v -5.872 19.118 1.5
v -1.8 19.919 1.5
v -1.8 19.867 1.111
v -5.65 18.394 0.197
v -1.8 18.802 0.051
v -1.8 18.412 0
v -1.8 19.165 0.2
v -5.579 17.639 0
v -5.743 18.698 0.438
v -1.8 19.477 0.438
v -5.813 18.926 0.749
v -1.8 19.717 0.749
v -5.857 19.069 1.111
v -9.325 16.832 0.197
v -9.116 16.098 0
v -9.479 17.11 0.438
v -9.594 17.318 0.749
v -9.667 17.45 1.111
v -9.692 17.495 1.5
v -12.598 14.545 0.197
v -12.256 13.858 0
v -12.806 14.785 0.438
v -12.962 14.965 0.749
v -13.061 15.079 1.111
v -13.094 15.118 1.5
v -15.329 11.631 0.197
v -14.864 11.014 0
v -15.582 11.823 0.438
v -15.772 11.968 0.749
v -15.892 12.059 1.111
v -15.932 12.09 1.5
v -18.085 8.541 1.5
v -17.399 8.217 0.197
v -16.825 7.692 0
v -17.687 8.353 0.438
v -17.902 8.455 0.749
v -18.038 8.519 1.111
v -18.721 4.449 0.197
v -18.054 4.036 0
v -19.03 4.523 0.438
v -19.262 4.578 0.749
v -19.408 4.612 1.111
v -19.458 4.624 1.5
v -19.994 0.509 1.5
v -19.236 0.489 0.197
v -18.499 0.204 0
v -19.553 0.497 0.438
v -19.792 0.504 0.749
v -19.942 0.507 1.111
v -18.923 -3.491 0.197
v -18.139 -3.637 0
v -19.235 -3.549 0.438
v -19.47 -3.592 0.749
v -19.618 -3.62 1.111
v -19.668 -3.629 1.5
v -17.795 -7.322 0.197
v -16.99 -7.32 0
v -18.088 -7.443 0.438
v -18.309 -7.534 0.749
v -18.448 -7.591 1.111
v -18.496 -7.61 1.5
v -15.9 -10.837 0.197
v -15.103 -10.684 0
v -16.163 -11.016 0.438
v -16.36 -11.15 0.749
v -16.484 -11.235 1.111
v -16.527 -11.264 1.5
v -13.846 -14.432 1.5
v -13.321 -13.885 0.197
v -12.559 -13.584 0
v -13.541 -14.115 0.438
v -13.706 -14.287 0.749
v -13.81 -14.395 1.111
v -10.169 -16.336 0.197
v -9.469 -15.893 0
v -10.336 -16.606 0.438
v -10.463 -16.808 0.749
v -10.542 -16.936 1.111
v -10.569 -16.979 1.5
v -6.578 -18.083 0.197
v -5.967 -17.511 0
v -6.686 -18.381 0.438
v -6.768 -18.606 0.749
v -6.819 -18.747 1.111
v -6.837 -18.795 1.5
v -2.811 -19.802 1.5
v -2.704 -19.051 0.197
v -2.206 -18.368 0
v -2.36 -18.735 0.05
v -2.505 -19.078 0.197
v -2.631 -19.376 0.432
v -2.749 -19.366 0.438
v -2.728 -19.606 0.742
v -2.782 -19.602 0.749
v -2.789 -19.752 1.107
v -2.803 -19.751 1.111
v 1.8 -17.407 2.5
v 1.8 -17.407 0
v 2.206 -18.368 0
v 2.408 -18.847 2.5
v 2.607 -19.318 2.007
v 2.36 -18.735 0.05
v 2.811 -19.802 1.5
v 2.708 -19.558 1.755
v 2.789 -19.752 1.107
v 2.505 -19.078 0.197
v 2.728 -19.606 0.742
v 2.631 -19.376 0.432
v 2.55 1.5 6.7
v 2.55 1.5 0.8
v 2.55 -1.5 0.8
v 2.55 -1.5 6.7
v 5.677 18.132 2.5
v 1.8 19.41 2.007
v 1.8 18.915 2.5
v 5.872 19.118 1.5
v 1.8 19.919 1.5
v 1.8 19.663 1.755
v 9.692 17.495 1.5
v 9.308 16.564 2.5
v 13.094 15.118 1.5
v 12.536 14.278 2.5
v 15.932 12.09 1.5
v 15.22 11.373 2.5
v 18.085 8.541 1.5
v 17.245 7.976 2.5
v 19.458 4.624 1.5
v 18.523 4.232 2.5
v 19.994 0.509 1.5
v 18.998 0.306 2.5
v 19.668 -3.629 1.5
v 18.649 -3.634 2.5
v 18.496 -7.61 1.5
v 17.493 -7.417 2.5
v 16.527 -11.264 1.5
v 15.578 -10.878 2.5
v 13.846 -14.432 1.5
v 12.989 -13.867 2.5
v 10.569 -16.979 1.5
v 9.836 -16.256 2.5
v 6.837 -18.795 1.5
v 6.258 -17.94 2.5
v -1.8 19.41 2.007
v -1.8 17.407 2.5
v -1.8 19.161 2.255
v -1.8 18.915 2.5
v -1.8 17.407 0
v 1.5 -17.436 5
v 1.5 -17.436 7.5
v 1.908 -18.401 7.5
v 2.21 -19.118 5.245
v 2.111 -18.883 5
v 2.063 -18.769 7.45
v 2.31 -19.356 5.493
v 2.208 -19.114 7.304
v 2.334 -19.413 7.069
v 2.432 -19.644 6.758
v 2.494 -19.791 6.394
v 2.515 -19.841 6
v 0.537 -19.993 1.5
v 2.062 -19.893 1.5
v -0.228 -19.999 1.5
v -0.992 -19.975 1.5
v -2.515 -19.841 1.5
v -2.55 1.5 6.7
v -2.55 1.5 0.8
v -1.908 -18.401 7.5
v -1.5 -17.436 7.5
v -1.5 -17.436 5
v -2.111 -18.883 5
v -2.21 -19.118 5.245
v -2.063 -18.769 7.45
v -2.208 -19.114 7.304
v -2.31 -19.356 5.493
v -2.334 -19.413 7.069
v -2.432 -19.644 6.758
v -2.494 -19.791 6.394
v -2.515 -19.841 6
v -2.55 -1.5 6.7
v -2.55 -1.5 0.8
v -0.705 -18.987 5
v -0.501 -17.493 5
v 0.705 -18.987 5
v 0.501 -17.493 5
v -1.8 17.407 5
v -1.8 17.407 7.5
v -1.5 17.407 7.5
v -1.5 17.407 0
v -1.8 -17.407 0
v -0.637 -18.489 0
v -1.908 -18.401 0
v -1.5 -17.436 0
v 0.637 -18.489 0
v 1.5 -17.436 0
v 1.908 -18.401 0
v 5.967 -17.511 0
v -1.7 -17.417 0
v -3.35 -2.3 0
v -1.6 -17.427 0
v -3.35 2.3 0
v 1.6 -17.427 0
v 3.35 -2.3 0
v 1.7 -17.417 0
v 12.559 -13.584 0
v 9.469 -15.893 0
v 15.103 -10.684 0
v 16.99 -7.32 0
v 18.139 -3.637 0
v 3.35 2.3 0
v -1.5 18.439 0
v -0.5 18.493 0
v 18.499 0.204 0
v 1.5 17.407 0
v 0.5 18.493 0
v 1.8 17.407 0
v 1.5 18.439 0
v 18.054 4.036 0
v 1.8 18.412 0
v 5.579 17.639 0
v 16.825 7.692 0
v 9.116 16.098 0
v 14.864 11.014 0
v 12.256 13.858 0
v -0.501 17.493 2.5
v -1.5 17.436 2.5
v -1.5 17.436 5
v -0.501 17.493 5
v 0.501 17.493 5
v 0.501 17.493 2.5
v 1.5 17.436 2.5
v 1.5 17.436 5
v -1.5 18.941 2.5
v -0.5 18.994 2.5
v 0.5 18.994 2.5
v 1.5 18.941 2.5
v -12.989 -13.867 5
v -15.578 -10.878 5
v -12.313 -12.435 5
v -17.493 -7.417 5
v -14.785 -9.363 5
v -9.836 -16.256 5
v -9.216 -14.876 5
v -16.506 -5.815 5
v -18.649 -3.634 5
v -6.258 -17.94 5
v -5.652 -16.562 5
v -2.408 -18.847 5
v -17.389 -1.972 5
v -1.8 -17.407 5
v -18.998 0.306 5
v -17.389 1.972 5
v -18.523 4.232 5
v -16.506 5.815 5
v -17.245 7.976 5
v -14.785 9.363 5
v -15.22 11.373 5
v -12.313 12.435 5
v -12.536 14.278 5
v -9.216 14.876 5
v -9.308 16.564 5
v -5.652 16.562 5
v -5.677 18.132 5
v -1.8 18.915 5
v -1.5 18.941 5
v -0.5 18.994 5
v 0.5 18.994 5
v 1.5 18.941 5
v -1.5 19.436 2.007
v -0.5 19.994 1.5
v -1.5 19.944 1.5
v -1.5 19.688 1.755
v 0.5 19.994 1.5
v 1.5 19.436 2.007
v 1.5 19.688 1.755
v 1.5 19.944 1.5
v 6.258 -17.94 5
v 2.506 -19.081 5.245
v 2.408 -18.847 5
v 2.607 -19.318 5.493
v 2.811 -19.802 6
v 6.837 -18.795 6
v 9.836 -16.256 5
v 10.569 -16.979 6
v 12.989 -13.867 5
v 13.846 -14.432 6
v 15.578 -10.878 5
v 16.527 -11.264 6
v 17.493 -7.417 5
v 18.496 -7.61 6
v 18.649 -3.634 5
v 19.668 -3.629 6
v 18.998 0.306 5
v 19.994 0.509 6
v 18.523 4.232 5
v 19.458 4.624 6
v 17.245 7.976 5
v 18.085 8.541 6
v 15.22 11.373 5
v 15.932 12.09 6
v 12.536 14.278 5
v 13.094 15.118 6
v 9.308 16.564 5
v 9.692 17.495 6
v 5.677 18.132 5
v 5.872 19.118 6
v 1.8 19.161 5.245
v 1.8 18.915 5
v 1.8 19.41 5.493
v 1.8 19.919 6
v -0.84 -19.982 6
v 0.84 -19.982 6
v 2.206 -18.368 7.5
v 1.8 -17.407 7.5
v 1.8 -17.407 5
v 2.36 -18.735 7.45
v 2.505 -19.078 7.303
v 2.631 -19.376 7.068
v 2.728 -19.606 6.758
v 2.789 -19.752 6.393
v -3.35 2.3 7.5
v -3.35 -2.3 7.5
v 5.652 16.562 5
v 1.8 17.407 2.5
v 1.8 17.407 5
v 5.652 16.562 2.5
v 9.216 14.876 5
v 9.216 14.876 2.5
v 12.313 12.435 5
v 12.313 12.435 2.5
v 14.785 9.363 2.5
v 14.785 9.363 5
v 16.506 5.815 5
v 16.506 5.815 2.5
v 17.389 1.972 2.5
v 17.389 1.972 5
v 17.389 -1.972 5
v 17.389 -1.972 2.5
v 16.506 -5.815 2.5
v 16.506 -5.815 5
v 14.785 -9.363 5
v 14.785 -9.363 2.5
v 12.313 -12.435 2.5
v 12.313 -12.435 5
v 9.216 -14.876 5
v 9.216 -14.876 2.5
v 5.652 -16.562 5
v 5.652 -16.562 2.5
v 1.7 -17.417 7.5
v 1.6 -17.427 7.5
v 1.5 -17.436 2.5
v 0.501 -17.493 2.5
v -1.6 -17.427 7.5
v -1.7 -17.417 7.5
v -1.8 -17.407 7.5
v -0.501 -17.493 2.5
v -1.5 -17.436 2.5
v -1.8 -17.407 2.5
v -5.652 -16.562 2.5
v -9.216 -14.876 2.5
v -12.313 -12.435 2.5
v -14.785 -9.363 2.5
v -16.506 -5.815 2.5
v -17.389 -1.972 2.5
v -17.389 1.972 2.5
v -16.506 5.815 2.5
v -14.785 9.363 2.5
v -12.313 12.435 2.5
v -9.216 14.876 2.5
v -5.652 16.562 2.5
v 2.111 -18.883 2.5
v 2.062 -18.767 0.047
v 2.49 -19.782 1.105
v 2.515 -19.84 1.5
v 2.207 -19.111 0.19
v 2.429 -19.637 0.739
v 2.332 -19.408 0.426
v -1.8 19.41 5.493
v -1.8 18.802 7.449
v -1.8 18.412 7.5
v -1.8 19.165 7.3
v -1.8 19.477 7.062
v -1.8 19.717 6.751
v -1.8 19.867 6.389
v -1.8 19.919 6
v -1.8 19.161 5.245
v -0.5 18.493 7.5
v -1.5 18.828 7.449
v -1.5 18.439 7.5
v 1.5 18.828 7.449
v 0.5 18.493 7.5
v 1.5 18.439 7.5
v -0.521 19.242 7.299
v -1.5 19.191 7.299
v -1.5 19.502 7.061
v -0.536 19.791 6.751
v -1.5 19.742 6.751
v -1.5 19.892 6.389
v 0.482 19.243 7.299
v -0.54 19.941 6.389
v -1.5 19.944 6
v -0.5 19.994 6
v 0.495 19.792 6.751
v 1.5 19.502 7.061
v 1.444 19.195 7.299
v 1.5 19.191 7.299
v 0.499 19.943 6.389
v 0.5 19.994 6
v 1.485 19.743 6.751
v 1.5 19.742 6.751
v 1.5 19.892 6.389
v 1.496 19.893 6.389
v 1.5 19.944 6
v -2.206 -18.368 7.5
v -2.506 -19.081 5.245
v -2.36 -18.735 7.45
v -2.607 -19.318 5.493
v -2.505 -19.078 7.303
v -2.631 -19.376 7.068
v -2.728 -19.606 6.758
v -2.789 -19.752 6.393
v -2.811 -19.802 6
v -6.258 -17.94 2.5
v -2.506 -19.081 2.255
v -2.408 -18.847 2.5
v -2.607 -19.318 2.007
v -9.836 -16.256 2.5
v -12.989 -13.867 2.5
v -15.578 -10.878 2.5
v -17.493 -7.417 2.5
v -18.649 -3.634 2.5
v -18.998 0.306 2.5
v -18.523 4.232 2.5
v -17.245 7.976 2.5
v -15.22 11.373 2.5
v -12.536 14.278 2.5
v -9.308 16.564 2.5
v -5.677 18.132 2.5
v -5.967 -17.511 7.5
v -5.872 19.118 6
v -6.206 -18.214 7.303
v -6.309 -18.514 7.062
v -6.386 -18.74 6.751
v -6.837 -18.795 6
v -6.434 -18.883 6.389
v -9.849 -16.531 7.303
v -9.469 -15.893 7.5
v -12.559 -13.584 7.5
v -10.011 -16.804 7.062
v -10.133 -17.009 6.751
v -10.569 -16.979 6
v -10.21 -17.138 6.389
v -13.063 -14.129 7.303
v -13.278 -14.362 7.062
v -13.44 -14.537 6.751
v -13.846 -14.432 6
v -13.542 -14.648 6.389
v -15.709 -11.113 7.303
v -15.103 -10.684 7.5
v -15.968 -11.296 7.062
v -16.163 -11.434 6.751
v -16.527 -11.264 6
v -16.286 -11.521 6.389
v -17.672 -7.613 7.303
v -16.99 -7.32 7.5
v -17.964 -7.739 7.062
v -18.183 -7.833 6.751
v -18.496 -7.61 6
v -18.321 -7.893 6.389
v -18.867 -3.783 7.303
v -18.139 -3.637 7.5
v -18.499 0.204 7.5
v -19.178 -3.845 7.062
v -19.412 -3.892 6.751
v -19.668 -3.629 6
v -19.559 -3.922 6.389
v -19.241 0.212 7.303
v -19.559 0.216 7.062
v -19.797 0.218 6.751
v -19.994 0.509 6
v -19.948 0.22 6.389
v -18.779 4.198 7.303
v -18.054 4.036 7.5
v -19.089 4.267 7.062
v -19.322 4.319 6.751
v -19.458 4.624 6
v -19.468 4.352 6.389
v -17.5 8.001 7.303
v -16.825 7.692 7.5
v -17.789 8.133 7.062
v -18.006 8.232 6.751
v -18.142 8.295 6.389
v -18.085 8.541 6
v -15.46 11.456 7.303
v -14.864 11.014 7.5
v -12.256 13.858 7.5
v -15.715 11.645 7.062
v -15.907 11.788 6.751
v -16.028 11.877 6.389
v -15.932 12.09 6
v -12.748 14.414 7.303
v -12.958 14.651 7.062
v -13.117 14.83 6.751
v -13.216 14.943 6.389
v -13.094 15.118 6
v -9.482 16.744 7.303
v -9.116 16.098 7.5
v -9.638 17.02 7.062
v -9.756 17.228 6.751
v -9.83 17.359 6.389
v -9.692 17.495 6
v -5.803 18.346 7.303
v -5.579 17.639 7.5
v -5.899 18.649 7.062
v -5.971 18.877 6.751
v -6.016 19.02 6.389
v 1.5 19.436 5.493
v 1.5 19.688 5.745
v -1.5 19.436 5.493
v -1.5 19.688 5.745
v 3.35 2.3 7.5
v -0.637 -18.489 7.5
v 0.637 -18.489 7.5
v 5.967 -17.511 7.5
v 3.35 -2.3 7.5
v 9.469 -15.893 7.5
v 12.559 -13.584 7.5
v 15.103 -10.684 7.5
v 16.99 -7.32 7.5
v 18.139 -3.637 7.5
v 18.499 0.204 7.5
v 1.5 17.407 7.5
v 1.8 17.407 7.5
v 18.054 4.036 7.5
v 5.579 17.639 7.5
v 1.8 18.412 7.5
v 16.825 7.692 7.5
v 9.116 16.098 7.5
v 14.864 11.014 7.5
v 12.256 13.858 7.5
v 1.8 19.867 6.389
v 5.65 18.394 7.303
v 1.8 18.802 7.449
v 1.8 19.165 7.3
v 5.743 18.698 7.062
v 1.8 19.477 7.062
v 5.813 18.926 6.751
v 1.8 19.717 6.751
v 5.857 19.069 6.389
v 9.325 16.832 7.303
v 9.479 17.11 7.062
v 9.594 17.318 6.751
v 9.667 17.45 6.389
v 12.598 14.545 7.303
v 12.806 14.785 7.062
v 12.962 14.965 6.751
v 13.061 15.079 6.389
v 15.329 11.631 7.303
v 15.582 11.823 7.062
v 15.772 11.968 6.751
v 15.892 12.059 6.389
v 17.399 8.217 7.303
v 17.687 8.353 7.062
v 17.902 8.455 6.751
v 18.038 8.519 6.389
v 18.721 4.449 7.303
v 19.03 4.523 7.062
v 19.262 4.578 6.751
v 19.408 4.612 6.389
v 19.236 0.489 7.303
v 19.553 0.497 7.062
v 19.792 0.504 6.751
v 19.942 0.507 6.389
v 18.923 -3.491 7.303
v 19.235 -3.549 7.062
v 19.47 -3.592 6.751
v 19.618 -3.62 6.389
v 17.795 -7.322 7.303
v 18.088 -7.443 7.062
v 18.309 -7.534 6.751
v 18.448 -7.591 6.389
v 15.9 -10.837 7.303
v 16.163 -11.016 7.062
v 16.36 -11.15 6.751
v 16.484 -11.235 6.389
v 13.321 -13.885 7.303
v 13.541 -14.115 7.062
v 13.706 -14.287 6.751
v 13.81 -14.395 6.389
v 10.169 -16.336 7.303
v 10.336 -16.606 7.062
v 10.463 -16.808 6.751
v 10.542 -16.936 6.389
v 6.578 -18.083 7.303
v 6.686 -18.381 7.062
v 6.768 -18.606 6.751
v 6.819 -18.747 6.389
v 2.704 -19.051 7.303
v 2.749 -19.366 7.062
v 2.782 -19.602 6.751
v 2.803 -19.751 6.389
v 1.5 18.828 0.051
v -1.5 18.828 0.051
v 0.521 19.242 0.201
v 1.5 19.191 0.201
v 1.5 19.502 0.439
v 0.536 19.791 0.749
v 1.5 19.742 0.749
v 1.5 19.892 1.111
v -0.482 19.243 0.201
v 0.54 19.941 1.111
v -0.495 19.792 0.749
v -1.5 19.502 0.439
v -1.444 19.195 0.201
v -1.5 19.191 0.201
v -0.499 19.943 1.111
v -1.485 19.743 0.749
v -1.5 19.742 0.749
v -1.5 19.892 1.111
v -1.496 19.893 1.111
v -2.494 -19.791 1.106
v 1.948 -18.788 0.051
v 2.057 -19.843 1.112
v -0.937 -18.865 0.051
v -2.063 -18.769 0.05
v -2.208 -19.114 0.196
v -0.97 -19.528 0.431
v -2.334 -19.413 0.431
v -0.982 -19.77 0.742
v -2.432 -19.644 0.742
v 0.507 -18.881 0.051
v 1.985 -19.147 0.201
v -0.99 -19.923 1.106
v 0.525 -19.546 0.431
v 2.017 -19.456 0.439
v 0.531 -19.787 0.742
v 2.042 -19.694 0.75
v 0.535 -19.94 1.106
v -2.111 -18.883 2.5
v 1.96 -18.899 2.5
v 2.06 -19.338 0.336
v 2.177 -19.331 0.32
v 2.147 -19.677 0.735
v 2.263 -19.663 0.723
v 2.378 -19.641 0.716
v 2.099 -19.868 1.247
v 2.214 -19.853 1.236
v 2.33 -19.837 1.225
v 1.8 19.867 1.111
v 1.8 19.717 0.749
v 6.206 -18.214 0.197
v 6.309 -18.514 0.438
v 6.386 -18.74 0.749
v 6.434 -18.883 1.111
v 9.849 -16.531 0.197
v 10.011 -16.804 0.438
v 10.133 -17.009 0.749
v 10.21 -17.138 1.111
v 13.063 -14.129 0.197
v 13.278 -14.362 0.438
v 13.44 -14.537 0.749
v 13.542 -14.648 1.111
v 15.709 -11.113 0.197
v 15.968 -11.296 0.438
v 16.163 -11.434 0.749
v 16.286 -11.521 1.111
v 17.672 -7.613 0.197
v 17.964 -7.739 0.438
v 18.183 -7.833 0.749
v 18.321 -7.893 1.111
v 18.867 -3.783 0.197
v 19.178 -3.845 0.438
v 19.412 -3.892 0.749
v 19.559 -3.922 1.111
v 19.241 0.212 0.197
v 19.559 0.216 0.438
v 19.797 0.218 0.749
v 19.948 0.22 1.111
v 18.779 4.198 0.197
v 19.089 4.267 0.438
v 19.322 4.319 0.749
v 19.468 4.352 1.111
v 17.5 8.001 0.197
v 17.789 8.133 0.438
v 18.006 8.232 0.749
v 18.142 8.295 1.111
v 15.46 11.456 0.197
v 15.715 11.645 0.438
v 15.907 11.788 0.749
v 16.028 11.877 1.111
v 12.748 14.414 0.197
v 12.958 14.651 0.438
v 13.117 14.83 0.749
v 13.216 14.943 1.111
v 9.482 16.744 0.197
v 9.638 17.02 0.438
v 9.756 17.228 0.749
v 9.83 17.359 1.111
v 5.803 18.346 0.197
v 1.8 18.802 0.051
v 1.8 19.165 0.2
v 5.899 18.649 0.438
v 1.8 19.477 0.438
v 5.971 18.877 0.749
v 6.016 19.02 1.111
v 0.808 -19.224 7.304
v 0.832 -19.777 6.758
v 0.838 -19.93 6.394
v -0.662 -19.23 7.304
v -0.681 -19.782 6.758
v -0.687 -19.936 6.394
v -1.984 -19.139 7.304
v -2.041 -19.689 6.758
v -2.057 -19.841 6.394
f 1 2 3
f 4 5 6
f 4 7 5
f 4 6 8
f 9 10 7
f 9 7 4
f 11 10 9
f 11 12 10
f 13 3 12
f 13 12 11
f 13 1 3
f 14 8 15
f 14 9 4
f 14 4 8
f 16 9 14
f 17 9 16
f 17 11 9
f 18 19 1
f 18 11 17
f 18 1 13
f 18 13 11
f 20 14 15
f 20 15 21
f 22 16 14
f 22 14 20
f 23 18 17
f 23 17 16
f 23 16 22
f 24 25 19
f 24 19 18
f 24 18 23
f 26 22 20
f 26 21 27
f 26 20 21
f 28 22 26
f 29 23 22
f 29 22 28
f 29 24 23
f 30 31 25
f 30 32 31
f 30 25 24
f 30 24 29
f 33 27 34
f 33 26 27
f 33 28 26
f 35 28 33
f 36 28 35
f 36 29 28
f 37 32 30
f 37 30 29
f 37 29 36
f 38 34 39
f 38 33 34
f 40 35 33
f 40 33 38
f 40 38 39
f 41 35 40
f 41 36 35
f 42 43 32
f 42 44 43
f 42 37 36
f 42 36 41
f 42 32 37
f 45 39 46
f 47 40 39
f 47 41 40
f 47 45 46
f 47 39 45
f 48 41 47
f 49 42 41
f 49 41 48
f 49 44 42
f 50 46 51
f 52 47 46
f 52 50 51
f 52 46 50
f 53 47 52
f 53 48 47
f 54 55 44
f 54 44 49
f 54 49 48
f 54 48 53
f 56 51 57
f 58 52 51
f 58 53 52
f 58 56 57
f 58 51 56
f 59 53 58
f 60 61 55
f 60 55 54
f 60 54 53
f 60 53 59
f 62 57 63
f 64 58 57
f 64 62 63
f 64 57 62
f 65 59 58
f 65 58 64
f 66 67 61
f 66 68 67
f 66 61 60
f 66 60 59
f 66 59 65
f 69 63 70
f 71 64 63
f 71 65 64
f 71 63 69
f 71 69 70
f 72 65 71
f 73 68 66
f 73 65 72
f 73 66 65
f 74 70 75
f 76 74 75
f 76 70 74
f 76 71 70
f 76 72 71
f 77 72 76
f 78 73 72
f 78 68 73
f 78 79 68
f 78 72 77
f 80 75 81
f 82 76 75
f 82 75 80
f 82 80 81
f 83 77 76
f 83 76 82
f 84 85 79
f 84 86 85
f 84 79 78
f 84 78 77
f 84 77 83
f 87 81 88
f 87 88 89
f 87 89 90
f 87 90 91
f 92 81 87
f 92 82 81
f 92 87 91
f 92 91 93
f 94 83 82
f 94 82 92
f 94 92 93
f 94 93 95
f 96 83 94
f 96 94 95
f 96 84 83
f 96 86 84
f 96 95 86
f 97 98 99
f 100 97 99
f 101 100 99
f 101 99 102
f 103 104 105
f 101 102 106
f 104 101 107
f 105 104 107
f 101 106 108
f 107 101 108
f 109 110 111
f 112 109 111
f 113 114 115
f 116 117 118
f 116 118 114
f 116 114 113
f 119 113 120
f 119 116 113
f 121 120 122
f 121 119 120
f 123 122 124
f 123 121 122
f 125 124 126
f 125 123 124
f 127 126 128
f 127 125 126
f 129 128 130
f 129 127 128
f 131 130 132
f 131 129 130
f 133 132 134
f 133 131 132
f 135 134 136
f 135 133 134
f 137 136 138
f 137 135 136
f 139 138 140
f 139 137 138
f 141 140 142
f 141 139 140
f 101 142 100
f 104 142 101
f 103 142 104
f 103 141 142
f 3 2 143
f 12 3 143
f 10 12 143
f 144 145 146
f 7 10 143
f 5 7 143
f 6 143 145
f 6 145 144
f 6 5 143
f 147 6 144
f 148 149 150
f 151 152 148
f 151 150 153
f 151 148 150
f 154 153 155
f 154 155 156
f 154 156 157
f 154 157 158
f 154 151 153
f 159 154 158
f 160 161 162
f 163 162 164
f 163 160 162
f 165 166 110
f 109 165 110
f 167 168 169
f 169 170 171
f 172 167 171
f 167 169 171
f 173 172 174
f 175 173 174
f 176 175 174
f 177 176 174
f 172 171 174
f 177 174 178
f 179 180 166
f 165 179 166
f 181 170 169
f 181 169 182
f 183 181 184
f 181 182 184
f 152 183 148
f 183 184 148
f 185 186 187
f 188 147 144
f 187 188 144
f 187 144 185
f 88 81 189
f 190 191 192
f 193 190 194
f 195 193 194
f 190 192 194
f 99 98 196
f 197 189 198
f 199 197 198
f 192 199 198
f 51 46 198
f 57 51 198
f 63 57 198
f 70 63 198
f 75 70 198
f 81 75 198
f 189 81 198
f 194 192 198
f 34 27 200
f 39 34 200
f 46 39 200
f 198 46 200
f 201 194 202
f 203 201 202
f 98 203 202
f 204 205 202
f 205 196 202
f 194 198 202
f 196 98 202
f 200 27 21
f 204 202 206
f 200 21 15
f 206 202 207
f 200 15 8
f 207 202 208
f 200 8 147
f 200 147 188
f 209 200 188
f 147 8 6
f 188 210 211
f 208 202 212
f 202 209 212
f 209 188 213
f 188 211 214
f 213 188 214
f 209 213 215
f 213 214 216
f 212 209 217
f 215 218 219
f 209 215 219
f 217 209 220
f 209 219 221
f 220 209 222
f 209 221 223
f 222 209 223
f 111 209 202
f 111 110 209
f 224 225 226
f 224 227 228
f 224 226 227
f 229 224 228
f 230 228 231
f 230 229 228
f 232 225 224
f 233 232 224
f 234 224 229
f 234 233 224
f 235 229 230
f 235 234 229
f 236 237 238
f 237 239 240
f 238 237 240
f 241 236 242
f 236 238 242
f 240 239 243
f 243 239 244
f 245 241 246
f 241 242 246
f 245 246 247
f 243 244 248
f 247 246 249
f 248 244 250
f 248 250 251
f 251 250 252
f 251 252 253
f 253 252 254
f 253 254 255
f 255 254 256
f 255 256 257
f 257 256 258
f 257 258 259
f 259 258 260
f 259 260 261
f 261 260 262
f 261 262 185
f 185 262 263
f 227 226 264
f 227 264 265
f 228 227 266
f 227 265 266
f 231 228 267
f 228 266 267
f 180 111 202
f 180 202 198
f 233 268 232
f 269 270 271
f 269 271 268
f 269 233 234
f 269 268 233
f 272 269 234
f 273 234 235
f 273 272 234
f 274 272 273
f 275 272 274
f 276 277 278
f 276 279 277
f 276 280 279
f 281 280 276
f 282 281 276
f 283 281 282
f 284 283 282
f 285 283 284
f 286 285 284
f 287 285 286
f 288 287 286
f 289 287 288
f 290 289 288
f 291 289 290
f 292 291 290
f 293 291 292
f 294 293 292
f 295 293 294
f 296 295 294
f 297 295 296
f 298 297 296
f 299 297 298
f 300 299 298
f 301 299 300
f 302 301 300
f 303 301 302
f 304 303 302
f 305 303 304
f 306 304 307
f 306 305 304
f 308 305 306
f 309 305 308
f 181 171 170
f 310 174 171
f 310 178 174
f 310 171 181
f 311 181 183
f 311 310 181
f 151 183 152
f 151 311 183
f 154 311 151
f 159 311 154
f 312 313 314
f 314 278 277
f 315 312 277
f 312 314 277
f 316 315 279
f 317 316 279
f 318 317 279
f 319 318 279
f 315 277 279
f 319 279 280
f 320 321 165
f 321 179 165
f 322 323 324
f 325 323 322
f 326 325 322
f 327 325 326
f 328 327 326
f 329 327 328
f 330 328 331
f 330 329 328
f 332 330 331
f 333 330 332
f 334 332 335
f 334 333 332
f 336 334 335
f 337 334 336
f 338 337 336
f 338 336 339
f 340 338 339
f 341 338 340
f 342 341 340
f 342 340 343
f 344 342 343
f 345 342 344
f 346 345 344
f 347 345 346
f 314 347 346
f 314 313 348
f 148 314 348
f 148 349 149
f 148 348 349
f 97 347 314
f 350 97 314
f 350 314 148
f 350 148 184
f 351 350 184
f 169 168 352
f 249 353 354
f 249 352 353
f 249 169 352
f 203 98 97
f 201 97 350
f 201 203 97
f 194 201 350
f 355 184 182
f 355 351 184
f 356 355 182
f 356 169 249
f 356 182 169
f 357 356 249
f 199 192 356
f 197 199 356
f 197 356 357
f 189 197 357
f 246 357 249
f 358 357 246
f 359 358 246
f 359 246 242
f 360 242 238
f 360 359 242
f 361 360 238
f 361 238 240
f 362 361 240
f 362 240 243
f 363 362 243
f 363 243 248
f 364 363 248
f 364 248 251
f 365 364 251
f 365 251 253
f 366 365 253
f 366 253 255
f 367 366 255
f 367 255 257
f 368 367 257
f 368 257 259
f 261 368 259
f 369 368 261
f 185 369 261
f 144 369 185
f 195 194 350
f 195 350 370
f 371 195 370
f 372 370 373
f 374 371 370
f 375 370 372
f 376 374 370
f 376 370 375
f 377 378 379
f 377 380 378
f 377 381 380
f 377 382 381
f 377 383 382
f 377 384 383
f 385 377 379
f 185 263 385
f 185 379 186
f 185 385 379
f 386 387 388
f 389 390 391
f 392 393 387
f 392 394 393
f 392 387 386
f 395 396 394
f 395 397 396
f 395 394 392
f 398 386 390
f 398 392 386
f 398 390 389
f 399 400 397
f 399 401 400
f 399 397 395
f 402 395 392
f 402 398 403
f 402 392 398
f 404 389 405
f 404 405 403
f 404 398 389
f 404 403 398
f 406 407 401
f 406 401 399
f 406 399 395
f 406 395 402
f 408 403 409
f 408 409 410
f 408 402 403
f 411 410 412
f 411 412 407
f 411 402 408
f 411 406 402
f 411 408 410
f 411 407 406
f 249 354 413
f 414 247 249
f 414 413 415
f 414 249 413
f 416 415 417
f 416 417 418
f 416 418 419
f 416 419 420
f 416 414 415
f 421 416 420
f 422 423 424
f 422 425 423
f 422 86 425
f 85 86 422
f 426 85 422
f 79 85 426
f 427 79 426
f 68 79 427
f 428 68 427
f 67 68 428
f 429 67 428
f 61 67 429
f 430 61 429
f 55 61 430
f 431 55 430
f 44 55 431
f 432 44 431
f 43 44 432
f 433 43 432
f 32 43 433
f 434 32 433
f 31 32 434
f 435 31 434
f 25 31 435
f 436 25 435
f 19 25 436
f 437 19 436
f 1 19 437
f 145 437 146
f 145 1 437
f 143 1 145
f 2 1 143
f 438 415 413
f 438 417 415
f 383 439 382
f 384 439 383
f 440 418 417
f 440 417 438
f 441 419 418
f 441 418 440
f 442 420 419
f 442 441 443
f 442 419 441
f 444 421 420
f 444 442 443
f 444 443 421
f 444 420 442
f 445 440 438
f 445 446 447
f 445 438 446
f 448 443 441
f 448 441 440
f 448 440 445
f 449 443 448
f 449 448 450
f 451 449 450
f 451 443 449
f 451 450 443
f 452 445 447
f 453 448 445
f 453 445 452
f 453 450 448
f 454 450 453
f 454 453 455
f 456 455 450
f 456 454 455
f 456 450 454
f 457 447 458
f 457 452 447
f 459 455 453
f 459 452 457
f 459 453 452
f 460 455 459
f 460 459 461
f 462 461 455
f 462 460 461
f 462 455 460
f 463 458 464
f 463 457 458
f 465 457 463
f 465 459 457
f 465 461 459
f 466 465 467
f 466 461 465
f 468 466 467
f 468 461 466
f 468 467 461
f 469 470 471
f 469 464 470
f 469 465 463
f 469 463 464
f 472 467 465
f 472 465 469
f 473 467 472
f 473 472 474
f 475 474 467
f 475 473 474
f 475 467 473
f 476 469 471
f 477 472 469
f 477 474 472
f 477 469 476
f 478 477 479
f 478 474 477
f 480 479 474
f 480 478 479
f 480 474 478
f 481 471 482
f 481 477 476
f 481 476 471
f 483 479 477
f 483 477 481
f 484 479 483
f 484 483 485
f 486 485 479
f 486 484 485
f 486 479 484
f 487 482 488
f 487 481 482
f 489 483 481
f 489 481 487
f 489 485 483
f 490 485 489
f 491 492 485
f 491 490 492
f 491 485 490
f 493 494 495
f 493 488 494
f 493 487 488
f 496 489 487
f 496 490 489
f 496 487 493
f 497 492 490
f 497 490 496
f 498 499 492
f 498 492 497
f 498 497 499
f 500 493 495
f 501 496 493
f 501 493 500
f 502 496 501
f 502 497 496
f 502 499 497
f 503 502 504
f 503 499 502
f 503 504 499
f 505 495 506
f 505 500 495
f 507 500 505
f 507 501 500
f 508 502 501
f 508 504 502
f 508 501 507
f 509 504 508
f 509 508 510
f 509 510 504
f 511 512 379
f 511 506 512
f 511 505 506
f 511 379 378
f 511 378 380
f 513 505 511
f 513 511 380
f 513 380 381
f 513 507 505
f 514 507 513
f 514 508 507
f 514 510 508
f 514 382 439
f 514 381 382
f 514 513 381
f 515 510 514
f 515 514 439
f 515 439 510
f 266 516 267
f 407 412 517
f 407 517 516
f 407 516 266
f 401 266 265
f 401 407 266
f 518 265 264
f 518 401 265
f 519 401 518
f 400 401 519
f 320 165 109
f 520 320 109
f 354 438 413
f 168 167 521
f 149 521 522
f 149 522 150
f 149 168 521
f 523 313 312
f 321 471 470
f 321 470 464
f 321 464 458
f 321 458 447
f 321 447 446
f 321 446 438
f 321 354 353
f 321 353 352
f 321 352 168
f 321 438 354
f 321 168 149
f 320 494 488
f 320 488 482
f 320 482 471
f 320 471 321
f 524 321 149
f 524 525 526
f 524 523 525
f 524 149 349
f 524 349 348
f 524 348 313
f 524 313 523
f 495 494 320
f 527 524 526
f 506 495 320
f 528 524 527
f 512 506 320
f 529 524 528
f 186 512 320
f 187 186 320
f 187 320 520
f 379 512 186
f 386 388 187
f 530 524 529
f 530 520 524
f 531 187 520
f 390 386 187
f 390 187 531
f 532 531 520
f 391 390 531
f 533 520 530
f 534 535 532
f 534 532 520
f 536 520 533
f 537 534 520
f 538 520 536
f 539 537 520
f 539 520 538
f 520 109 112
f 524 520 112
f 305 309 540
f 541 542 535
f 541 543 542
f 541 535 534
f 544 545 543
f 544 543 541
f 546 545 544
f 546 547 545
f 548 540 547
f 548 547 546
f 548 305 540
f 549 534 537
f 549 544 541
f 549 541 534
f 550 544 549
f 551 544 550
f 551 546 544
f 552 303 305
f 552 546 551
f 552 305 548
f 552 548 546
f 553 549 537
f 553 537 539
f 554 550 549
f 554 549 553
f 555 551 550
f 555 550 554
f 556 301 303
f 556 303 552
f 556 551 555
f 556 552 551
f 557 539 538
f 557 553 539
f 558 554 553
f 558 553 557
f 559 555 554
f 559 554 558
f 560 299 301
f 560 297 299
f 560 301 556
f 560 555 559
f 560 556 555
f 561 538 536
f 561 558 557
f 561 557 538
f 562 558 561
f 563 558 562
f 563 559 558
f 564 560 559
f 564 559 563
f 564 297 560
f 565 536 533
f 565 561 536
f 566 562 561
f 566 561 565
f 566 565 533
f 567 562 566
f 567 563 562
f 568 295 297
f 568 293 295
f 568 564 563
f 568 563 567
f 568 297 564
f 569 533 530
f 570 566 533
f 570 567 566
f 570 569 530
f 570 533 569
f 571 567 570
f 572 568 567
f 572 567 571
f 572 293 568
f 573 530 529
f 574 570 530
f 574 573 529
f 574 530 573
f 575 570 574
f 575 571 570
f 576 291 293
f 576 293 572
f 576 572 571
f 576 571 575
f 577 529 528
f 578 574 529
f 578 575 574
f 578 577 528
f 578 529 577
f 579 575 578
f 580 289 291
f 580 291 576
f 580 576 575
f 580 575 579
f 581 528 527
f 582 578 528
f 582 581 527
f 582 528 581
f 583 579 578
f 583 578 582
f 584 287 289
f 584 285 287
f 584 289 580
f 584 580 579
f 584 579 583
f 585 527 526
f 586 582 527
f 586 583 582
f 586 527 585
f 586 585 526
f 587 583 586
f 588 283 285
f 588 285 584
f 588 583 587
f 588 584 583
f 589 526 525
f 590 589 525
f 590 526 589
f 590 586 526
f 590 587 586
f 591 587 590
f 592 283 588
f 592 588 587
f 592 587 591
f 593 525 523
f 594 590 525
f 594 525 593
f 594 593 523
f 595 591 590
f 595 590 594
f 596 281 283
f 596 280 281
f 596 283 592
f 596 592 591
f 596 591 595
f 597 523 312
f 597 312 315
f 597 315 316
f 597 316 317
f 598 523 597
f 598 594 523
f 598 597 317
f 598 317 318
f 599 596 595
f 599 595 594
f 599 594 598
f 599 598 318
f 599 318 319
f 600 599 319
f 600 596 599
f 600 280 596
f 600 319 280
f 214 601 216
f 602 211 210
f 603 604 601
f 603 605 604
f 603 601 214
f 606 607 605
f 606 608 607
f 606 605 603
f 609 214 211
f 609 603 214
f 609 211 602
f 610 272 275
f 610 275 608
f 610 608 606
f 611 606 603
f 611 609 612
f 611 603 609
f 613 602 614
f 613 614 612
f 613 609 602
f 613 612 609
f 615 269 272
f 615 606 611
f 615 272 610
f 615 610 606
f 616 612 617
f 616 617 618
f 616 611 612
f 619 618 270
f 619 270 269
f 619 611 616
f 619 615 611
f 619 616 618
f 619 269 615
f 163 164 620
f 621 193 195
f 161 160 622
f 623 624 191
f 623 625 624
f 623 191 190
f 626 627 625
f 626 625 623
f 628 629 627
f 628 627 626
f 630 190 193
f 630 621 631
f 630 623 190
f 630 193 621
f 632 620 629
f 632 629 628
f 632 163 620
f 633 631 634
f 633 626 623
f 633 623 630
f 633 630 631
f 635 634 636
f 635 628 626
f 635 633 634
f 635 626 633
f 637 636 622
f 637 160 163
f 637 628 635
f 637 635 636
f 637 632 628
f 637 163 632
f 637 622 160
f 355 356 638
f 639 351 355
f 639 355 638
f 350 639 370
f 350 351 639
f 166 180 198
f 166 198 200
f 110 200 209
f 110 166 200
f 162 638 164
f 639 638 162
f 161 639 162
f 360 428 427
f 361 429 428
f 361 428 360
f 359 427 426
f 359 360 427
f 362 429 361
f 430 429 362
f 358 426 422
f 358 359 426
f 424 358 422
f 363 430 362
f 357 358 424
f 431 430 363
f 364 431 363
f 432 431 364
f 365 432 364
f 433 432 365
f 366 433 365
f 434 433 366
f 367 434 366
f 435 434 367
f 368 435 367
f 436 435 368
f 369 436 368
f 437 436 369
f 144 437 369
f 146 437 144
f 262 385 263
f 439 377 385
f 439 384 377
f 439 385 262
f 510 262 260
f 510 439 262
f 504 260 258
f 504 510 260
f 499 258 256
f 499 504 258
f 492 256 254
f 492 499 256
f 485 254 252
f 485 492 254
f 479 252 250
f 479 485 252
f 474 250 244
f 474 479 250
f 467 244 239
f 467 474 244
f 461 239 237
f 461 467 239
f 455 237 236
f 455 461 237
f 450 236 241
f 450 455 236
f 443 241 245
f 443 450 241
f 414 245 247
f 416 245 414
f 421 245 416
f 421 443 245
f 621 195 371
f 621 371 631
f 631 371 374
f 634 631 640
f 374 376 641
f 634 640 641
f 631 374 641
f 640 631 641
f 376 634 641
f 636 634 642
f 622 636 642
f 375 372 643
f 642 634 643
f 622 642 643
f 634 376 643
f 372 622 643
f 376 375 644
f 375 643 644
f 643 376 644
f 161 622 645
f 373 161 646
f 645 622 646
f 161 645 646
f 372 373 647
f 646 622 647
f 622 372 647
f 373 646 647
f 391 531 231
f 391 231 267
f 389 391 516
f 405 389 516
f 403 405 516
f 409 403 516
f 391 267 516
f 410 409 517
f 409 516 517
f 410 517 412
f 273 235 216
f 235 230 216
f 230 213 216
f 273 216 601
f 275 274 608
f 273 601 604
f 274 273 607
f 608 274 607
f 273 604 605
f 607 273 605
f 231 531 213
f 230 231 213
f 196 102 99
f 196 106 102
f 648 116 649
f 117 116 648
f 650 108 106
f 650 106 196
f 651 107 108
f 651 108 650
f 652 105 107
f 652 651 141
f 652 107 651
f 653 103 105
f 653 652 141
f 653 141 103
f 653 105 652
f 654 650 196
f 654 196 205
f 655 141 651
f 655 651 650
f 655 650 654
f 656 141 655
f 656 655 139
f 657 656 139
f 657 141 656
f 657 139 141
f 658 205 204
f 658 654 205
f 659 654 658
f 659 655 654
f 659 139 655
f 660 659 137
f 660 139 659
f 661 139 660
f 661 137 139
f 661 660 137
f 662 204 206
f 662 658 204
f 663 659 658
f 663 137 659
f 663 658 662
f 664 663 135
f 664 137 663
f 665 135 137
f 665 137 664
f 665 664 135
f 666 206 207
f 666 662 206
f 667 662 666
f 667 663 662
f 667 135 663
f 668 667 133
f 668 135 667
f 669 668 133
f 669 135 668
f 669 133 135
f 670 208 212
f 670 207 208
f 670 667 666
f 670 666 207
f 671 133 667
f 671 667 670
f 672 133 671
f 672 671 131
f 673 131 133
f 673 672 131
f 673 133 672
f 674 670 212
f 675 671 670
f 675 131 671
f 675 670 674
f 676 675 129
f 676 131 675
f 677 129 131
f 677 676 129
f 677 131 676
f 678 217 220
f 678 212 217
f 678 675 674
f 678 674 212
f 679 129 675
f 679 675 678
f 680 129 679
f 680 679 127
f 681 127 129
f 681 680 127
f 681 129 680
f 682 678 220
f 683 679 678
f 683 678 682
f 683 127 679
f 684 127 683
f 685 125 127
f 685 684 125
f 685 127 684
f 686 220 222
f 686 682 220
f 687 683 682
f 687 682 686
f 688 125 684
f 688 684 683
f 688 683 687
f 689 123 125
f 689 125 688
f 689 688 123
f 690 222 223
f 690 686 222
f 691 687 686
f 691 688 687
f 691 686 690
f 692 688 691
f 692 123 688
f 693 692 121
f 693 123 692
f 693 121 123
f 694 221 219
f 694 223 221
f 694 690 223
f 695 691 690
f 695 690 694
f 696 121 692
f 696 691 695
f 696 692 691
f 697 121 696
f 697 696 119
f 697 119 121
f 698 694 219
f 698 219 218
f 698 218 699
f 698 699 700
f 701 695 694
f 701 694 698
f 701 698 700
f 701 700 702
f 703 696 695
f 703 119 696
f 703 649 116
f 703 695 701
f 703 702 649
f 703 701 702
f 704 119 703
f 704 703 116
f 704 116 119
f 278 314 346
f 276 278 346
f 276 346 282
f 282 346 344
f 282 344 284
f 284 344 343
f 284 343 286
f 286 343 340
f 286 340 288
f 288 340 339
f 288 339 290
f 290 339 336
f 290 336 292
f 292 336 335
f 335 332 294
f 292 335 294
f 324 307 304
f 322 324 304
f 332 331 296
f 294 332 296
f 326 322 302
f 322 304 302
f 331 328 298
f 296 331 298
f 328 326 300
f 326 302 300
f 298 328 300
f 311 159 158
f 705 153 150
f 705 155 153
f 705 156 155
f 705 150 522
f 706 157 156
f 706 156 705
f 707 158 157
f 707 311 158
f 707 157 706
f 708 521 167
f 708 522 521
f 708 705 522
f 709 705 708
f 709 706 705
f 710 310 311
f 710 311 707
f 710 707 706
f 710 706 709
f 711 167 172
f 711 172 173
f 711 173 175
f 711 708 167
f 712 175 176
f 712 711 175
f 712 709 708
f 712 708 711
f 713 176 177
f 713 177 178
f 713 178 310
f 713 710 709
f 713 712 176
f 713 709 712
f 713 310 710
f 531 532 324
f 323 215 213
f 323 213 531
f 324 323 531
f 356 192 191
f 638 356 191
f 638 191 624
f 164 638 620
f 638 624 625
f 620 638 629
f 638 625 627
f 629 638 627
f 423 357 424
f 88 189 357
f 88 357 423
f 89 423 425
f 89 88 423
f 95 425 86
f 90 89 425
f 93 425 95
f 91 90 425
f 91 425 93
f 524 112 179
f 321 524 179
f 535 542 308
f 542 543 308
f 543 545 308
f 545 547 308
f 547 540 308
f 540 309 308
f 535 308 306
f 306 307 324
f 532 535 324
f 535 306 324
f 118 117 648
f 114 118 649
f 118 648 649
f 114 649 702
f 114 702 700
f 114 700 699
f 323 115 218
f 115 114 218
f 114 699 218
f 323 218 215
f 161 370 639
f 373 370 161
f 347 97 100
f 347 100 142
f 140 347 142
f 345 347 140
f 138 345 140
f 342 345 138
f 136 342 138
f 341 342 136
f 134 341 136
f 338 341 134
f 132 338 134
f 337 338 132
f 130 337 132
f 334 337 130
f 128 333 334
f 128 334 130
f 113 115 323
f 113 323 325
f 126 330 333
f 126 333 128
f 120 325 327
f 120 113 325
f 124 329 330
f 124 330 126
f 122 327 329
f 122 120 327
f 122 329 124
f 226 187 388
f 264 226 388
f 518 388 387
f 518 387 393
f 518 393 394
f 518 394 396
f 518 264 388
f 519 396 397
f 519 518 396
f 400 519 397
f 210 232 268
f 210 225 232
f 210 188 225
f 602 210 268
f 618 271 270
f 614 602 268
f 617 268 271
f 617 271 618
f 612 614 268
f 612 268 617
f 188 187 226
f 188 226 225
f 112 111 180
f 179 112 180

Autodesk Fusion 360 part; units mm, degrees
sketch "Skizze1" plane through (0, 0, 0) normal (0, 0, 1) x (1, 0, 0)
  circle A0 centre (0, 0) radius 20
  circle A1 centre (0, 0) radius 17.5
  line L0 (2.55, -1.5) -> (-2.55, -1.5)
  line L1 (-2.55, -1.5) -> (-2.55, 1.5)
  line L2 (-2.55, 1.5) -> (2.55, 1.5)
  line L3 (2.55, 1.5) -> (2.55, -1.5)
  line L4 (2.55, -1.5) -> (-2.55, 1.5) construction
  line L5 (-2.55, -1.5) -> (2.55, 1.5) construction
  line L6 (-1.5, 19.9437) -> (-1.8, 19.9437)
  line L7 (-1.8, 19.9437) -> (-1.8, 17.4072)
  line L8 (-1.8, 17.4072) -> (-1.5, 17.4072)
  line L9 (-1.5, 17.4072) -> (-1.5, 19.9437)
  line L10 (1.5, 19.9437) -> (1.8, 19.9437)
  line L11 (1.8, 19.9437) -> (1.8, 17.4072)
  line L12 (1.8, 17.4072) -> (1.5, 17.4072)
  line L13 (1.5, 17.4072) -> (1.5, 19.9437)
  line L14 (-1.5, -17.4356) -> (-2.5152, -19.8412)
  line L15 (-1.8, -17.4072) -> (-2.8105, -19.8015)
  line L16 (0, 0) -> (0, -21.9932) construction
  line L17 (1.8, -17.4072) -> (2.8105, -19.8015)
  line L18 (1.5, -17.4356) -> (2.5152, -19.8412)
  dimension "d1" = 40
  dimension "d2" = 35
  dimension "d3" = 5.1
  dimension "d4" = 3
  dimension "d14" = 0.3
  dimension "d15" = 1.5
  dimension "d16" = 0.3
  dimension "d17" = 1.5
  dimension "d29" = 0.3
  dimension "d30" = 1.5
extrude "Extrusion1" add sketch "Skizze1" along normal blind 2.5 contours A0 A1 L9 L13 | A0 A1 L11 L17 | A1 L8 L9 L12 L13 | A0 A1 L7 L15 | A0 A1 L14 L18
extrude "Extrusion2" add sketch "Skizze1" along normal blind 7.5 contours A1 L8 L9 L12 L13
extrude "Extrusion3" add sketch "Skizze1" along normal blind 2.5 from surface at 5 contours A0 A1 L9 L13 | A0 A1 L11 L17 | A0 A1 L7 L15 | A0 A1 L14 L18
chamfer "Fase1" distance 0.8 angle 45 8 edges at (0, 1.5, 0) (-2.55, 0, 0) (0, -1.5, 0) (2.55, 0, 0) (-2.55, 0, 7.5) (0, 1.5, 7.5) (2.55, 0, 7.5) (0, -1.5, 7.5)
fillet "Abrundung2" radius 1.5 8 edges at (-19.9935, 0.5086, 7.5) (-19.9935, 0.5086, 0) (0, 20, 0) (0, 20, 7.5) (19.9935, 0.5086, 7.5) (0, -20, 7.5) (0, -20, 0) (19.9935, 0.5086, 0)
chamfer "Fase2" distance 1 angle 45 8 edges at (19.9935, 0.5086, 2.5) (-19.9935, 0.5086, 5) (19.9935, 0.5086, 5) (-19.9935, 0.5086, 2.5) (0, 20, 2.5) (0, 20, 5) (0, -20, 5) (0, -20, 2.5)
equation "d16 = d14"
equation "d17 = d15"
